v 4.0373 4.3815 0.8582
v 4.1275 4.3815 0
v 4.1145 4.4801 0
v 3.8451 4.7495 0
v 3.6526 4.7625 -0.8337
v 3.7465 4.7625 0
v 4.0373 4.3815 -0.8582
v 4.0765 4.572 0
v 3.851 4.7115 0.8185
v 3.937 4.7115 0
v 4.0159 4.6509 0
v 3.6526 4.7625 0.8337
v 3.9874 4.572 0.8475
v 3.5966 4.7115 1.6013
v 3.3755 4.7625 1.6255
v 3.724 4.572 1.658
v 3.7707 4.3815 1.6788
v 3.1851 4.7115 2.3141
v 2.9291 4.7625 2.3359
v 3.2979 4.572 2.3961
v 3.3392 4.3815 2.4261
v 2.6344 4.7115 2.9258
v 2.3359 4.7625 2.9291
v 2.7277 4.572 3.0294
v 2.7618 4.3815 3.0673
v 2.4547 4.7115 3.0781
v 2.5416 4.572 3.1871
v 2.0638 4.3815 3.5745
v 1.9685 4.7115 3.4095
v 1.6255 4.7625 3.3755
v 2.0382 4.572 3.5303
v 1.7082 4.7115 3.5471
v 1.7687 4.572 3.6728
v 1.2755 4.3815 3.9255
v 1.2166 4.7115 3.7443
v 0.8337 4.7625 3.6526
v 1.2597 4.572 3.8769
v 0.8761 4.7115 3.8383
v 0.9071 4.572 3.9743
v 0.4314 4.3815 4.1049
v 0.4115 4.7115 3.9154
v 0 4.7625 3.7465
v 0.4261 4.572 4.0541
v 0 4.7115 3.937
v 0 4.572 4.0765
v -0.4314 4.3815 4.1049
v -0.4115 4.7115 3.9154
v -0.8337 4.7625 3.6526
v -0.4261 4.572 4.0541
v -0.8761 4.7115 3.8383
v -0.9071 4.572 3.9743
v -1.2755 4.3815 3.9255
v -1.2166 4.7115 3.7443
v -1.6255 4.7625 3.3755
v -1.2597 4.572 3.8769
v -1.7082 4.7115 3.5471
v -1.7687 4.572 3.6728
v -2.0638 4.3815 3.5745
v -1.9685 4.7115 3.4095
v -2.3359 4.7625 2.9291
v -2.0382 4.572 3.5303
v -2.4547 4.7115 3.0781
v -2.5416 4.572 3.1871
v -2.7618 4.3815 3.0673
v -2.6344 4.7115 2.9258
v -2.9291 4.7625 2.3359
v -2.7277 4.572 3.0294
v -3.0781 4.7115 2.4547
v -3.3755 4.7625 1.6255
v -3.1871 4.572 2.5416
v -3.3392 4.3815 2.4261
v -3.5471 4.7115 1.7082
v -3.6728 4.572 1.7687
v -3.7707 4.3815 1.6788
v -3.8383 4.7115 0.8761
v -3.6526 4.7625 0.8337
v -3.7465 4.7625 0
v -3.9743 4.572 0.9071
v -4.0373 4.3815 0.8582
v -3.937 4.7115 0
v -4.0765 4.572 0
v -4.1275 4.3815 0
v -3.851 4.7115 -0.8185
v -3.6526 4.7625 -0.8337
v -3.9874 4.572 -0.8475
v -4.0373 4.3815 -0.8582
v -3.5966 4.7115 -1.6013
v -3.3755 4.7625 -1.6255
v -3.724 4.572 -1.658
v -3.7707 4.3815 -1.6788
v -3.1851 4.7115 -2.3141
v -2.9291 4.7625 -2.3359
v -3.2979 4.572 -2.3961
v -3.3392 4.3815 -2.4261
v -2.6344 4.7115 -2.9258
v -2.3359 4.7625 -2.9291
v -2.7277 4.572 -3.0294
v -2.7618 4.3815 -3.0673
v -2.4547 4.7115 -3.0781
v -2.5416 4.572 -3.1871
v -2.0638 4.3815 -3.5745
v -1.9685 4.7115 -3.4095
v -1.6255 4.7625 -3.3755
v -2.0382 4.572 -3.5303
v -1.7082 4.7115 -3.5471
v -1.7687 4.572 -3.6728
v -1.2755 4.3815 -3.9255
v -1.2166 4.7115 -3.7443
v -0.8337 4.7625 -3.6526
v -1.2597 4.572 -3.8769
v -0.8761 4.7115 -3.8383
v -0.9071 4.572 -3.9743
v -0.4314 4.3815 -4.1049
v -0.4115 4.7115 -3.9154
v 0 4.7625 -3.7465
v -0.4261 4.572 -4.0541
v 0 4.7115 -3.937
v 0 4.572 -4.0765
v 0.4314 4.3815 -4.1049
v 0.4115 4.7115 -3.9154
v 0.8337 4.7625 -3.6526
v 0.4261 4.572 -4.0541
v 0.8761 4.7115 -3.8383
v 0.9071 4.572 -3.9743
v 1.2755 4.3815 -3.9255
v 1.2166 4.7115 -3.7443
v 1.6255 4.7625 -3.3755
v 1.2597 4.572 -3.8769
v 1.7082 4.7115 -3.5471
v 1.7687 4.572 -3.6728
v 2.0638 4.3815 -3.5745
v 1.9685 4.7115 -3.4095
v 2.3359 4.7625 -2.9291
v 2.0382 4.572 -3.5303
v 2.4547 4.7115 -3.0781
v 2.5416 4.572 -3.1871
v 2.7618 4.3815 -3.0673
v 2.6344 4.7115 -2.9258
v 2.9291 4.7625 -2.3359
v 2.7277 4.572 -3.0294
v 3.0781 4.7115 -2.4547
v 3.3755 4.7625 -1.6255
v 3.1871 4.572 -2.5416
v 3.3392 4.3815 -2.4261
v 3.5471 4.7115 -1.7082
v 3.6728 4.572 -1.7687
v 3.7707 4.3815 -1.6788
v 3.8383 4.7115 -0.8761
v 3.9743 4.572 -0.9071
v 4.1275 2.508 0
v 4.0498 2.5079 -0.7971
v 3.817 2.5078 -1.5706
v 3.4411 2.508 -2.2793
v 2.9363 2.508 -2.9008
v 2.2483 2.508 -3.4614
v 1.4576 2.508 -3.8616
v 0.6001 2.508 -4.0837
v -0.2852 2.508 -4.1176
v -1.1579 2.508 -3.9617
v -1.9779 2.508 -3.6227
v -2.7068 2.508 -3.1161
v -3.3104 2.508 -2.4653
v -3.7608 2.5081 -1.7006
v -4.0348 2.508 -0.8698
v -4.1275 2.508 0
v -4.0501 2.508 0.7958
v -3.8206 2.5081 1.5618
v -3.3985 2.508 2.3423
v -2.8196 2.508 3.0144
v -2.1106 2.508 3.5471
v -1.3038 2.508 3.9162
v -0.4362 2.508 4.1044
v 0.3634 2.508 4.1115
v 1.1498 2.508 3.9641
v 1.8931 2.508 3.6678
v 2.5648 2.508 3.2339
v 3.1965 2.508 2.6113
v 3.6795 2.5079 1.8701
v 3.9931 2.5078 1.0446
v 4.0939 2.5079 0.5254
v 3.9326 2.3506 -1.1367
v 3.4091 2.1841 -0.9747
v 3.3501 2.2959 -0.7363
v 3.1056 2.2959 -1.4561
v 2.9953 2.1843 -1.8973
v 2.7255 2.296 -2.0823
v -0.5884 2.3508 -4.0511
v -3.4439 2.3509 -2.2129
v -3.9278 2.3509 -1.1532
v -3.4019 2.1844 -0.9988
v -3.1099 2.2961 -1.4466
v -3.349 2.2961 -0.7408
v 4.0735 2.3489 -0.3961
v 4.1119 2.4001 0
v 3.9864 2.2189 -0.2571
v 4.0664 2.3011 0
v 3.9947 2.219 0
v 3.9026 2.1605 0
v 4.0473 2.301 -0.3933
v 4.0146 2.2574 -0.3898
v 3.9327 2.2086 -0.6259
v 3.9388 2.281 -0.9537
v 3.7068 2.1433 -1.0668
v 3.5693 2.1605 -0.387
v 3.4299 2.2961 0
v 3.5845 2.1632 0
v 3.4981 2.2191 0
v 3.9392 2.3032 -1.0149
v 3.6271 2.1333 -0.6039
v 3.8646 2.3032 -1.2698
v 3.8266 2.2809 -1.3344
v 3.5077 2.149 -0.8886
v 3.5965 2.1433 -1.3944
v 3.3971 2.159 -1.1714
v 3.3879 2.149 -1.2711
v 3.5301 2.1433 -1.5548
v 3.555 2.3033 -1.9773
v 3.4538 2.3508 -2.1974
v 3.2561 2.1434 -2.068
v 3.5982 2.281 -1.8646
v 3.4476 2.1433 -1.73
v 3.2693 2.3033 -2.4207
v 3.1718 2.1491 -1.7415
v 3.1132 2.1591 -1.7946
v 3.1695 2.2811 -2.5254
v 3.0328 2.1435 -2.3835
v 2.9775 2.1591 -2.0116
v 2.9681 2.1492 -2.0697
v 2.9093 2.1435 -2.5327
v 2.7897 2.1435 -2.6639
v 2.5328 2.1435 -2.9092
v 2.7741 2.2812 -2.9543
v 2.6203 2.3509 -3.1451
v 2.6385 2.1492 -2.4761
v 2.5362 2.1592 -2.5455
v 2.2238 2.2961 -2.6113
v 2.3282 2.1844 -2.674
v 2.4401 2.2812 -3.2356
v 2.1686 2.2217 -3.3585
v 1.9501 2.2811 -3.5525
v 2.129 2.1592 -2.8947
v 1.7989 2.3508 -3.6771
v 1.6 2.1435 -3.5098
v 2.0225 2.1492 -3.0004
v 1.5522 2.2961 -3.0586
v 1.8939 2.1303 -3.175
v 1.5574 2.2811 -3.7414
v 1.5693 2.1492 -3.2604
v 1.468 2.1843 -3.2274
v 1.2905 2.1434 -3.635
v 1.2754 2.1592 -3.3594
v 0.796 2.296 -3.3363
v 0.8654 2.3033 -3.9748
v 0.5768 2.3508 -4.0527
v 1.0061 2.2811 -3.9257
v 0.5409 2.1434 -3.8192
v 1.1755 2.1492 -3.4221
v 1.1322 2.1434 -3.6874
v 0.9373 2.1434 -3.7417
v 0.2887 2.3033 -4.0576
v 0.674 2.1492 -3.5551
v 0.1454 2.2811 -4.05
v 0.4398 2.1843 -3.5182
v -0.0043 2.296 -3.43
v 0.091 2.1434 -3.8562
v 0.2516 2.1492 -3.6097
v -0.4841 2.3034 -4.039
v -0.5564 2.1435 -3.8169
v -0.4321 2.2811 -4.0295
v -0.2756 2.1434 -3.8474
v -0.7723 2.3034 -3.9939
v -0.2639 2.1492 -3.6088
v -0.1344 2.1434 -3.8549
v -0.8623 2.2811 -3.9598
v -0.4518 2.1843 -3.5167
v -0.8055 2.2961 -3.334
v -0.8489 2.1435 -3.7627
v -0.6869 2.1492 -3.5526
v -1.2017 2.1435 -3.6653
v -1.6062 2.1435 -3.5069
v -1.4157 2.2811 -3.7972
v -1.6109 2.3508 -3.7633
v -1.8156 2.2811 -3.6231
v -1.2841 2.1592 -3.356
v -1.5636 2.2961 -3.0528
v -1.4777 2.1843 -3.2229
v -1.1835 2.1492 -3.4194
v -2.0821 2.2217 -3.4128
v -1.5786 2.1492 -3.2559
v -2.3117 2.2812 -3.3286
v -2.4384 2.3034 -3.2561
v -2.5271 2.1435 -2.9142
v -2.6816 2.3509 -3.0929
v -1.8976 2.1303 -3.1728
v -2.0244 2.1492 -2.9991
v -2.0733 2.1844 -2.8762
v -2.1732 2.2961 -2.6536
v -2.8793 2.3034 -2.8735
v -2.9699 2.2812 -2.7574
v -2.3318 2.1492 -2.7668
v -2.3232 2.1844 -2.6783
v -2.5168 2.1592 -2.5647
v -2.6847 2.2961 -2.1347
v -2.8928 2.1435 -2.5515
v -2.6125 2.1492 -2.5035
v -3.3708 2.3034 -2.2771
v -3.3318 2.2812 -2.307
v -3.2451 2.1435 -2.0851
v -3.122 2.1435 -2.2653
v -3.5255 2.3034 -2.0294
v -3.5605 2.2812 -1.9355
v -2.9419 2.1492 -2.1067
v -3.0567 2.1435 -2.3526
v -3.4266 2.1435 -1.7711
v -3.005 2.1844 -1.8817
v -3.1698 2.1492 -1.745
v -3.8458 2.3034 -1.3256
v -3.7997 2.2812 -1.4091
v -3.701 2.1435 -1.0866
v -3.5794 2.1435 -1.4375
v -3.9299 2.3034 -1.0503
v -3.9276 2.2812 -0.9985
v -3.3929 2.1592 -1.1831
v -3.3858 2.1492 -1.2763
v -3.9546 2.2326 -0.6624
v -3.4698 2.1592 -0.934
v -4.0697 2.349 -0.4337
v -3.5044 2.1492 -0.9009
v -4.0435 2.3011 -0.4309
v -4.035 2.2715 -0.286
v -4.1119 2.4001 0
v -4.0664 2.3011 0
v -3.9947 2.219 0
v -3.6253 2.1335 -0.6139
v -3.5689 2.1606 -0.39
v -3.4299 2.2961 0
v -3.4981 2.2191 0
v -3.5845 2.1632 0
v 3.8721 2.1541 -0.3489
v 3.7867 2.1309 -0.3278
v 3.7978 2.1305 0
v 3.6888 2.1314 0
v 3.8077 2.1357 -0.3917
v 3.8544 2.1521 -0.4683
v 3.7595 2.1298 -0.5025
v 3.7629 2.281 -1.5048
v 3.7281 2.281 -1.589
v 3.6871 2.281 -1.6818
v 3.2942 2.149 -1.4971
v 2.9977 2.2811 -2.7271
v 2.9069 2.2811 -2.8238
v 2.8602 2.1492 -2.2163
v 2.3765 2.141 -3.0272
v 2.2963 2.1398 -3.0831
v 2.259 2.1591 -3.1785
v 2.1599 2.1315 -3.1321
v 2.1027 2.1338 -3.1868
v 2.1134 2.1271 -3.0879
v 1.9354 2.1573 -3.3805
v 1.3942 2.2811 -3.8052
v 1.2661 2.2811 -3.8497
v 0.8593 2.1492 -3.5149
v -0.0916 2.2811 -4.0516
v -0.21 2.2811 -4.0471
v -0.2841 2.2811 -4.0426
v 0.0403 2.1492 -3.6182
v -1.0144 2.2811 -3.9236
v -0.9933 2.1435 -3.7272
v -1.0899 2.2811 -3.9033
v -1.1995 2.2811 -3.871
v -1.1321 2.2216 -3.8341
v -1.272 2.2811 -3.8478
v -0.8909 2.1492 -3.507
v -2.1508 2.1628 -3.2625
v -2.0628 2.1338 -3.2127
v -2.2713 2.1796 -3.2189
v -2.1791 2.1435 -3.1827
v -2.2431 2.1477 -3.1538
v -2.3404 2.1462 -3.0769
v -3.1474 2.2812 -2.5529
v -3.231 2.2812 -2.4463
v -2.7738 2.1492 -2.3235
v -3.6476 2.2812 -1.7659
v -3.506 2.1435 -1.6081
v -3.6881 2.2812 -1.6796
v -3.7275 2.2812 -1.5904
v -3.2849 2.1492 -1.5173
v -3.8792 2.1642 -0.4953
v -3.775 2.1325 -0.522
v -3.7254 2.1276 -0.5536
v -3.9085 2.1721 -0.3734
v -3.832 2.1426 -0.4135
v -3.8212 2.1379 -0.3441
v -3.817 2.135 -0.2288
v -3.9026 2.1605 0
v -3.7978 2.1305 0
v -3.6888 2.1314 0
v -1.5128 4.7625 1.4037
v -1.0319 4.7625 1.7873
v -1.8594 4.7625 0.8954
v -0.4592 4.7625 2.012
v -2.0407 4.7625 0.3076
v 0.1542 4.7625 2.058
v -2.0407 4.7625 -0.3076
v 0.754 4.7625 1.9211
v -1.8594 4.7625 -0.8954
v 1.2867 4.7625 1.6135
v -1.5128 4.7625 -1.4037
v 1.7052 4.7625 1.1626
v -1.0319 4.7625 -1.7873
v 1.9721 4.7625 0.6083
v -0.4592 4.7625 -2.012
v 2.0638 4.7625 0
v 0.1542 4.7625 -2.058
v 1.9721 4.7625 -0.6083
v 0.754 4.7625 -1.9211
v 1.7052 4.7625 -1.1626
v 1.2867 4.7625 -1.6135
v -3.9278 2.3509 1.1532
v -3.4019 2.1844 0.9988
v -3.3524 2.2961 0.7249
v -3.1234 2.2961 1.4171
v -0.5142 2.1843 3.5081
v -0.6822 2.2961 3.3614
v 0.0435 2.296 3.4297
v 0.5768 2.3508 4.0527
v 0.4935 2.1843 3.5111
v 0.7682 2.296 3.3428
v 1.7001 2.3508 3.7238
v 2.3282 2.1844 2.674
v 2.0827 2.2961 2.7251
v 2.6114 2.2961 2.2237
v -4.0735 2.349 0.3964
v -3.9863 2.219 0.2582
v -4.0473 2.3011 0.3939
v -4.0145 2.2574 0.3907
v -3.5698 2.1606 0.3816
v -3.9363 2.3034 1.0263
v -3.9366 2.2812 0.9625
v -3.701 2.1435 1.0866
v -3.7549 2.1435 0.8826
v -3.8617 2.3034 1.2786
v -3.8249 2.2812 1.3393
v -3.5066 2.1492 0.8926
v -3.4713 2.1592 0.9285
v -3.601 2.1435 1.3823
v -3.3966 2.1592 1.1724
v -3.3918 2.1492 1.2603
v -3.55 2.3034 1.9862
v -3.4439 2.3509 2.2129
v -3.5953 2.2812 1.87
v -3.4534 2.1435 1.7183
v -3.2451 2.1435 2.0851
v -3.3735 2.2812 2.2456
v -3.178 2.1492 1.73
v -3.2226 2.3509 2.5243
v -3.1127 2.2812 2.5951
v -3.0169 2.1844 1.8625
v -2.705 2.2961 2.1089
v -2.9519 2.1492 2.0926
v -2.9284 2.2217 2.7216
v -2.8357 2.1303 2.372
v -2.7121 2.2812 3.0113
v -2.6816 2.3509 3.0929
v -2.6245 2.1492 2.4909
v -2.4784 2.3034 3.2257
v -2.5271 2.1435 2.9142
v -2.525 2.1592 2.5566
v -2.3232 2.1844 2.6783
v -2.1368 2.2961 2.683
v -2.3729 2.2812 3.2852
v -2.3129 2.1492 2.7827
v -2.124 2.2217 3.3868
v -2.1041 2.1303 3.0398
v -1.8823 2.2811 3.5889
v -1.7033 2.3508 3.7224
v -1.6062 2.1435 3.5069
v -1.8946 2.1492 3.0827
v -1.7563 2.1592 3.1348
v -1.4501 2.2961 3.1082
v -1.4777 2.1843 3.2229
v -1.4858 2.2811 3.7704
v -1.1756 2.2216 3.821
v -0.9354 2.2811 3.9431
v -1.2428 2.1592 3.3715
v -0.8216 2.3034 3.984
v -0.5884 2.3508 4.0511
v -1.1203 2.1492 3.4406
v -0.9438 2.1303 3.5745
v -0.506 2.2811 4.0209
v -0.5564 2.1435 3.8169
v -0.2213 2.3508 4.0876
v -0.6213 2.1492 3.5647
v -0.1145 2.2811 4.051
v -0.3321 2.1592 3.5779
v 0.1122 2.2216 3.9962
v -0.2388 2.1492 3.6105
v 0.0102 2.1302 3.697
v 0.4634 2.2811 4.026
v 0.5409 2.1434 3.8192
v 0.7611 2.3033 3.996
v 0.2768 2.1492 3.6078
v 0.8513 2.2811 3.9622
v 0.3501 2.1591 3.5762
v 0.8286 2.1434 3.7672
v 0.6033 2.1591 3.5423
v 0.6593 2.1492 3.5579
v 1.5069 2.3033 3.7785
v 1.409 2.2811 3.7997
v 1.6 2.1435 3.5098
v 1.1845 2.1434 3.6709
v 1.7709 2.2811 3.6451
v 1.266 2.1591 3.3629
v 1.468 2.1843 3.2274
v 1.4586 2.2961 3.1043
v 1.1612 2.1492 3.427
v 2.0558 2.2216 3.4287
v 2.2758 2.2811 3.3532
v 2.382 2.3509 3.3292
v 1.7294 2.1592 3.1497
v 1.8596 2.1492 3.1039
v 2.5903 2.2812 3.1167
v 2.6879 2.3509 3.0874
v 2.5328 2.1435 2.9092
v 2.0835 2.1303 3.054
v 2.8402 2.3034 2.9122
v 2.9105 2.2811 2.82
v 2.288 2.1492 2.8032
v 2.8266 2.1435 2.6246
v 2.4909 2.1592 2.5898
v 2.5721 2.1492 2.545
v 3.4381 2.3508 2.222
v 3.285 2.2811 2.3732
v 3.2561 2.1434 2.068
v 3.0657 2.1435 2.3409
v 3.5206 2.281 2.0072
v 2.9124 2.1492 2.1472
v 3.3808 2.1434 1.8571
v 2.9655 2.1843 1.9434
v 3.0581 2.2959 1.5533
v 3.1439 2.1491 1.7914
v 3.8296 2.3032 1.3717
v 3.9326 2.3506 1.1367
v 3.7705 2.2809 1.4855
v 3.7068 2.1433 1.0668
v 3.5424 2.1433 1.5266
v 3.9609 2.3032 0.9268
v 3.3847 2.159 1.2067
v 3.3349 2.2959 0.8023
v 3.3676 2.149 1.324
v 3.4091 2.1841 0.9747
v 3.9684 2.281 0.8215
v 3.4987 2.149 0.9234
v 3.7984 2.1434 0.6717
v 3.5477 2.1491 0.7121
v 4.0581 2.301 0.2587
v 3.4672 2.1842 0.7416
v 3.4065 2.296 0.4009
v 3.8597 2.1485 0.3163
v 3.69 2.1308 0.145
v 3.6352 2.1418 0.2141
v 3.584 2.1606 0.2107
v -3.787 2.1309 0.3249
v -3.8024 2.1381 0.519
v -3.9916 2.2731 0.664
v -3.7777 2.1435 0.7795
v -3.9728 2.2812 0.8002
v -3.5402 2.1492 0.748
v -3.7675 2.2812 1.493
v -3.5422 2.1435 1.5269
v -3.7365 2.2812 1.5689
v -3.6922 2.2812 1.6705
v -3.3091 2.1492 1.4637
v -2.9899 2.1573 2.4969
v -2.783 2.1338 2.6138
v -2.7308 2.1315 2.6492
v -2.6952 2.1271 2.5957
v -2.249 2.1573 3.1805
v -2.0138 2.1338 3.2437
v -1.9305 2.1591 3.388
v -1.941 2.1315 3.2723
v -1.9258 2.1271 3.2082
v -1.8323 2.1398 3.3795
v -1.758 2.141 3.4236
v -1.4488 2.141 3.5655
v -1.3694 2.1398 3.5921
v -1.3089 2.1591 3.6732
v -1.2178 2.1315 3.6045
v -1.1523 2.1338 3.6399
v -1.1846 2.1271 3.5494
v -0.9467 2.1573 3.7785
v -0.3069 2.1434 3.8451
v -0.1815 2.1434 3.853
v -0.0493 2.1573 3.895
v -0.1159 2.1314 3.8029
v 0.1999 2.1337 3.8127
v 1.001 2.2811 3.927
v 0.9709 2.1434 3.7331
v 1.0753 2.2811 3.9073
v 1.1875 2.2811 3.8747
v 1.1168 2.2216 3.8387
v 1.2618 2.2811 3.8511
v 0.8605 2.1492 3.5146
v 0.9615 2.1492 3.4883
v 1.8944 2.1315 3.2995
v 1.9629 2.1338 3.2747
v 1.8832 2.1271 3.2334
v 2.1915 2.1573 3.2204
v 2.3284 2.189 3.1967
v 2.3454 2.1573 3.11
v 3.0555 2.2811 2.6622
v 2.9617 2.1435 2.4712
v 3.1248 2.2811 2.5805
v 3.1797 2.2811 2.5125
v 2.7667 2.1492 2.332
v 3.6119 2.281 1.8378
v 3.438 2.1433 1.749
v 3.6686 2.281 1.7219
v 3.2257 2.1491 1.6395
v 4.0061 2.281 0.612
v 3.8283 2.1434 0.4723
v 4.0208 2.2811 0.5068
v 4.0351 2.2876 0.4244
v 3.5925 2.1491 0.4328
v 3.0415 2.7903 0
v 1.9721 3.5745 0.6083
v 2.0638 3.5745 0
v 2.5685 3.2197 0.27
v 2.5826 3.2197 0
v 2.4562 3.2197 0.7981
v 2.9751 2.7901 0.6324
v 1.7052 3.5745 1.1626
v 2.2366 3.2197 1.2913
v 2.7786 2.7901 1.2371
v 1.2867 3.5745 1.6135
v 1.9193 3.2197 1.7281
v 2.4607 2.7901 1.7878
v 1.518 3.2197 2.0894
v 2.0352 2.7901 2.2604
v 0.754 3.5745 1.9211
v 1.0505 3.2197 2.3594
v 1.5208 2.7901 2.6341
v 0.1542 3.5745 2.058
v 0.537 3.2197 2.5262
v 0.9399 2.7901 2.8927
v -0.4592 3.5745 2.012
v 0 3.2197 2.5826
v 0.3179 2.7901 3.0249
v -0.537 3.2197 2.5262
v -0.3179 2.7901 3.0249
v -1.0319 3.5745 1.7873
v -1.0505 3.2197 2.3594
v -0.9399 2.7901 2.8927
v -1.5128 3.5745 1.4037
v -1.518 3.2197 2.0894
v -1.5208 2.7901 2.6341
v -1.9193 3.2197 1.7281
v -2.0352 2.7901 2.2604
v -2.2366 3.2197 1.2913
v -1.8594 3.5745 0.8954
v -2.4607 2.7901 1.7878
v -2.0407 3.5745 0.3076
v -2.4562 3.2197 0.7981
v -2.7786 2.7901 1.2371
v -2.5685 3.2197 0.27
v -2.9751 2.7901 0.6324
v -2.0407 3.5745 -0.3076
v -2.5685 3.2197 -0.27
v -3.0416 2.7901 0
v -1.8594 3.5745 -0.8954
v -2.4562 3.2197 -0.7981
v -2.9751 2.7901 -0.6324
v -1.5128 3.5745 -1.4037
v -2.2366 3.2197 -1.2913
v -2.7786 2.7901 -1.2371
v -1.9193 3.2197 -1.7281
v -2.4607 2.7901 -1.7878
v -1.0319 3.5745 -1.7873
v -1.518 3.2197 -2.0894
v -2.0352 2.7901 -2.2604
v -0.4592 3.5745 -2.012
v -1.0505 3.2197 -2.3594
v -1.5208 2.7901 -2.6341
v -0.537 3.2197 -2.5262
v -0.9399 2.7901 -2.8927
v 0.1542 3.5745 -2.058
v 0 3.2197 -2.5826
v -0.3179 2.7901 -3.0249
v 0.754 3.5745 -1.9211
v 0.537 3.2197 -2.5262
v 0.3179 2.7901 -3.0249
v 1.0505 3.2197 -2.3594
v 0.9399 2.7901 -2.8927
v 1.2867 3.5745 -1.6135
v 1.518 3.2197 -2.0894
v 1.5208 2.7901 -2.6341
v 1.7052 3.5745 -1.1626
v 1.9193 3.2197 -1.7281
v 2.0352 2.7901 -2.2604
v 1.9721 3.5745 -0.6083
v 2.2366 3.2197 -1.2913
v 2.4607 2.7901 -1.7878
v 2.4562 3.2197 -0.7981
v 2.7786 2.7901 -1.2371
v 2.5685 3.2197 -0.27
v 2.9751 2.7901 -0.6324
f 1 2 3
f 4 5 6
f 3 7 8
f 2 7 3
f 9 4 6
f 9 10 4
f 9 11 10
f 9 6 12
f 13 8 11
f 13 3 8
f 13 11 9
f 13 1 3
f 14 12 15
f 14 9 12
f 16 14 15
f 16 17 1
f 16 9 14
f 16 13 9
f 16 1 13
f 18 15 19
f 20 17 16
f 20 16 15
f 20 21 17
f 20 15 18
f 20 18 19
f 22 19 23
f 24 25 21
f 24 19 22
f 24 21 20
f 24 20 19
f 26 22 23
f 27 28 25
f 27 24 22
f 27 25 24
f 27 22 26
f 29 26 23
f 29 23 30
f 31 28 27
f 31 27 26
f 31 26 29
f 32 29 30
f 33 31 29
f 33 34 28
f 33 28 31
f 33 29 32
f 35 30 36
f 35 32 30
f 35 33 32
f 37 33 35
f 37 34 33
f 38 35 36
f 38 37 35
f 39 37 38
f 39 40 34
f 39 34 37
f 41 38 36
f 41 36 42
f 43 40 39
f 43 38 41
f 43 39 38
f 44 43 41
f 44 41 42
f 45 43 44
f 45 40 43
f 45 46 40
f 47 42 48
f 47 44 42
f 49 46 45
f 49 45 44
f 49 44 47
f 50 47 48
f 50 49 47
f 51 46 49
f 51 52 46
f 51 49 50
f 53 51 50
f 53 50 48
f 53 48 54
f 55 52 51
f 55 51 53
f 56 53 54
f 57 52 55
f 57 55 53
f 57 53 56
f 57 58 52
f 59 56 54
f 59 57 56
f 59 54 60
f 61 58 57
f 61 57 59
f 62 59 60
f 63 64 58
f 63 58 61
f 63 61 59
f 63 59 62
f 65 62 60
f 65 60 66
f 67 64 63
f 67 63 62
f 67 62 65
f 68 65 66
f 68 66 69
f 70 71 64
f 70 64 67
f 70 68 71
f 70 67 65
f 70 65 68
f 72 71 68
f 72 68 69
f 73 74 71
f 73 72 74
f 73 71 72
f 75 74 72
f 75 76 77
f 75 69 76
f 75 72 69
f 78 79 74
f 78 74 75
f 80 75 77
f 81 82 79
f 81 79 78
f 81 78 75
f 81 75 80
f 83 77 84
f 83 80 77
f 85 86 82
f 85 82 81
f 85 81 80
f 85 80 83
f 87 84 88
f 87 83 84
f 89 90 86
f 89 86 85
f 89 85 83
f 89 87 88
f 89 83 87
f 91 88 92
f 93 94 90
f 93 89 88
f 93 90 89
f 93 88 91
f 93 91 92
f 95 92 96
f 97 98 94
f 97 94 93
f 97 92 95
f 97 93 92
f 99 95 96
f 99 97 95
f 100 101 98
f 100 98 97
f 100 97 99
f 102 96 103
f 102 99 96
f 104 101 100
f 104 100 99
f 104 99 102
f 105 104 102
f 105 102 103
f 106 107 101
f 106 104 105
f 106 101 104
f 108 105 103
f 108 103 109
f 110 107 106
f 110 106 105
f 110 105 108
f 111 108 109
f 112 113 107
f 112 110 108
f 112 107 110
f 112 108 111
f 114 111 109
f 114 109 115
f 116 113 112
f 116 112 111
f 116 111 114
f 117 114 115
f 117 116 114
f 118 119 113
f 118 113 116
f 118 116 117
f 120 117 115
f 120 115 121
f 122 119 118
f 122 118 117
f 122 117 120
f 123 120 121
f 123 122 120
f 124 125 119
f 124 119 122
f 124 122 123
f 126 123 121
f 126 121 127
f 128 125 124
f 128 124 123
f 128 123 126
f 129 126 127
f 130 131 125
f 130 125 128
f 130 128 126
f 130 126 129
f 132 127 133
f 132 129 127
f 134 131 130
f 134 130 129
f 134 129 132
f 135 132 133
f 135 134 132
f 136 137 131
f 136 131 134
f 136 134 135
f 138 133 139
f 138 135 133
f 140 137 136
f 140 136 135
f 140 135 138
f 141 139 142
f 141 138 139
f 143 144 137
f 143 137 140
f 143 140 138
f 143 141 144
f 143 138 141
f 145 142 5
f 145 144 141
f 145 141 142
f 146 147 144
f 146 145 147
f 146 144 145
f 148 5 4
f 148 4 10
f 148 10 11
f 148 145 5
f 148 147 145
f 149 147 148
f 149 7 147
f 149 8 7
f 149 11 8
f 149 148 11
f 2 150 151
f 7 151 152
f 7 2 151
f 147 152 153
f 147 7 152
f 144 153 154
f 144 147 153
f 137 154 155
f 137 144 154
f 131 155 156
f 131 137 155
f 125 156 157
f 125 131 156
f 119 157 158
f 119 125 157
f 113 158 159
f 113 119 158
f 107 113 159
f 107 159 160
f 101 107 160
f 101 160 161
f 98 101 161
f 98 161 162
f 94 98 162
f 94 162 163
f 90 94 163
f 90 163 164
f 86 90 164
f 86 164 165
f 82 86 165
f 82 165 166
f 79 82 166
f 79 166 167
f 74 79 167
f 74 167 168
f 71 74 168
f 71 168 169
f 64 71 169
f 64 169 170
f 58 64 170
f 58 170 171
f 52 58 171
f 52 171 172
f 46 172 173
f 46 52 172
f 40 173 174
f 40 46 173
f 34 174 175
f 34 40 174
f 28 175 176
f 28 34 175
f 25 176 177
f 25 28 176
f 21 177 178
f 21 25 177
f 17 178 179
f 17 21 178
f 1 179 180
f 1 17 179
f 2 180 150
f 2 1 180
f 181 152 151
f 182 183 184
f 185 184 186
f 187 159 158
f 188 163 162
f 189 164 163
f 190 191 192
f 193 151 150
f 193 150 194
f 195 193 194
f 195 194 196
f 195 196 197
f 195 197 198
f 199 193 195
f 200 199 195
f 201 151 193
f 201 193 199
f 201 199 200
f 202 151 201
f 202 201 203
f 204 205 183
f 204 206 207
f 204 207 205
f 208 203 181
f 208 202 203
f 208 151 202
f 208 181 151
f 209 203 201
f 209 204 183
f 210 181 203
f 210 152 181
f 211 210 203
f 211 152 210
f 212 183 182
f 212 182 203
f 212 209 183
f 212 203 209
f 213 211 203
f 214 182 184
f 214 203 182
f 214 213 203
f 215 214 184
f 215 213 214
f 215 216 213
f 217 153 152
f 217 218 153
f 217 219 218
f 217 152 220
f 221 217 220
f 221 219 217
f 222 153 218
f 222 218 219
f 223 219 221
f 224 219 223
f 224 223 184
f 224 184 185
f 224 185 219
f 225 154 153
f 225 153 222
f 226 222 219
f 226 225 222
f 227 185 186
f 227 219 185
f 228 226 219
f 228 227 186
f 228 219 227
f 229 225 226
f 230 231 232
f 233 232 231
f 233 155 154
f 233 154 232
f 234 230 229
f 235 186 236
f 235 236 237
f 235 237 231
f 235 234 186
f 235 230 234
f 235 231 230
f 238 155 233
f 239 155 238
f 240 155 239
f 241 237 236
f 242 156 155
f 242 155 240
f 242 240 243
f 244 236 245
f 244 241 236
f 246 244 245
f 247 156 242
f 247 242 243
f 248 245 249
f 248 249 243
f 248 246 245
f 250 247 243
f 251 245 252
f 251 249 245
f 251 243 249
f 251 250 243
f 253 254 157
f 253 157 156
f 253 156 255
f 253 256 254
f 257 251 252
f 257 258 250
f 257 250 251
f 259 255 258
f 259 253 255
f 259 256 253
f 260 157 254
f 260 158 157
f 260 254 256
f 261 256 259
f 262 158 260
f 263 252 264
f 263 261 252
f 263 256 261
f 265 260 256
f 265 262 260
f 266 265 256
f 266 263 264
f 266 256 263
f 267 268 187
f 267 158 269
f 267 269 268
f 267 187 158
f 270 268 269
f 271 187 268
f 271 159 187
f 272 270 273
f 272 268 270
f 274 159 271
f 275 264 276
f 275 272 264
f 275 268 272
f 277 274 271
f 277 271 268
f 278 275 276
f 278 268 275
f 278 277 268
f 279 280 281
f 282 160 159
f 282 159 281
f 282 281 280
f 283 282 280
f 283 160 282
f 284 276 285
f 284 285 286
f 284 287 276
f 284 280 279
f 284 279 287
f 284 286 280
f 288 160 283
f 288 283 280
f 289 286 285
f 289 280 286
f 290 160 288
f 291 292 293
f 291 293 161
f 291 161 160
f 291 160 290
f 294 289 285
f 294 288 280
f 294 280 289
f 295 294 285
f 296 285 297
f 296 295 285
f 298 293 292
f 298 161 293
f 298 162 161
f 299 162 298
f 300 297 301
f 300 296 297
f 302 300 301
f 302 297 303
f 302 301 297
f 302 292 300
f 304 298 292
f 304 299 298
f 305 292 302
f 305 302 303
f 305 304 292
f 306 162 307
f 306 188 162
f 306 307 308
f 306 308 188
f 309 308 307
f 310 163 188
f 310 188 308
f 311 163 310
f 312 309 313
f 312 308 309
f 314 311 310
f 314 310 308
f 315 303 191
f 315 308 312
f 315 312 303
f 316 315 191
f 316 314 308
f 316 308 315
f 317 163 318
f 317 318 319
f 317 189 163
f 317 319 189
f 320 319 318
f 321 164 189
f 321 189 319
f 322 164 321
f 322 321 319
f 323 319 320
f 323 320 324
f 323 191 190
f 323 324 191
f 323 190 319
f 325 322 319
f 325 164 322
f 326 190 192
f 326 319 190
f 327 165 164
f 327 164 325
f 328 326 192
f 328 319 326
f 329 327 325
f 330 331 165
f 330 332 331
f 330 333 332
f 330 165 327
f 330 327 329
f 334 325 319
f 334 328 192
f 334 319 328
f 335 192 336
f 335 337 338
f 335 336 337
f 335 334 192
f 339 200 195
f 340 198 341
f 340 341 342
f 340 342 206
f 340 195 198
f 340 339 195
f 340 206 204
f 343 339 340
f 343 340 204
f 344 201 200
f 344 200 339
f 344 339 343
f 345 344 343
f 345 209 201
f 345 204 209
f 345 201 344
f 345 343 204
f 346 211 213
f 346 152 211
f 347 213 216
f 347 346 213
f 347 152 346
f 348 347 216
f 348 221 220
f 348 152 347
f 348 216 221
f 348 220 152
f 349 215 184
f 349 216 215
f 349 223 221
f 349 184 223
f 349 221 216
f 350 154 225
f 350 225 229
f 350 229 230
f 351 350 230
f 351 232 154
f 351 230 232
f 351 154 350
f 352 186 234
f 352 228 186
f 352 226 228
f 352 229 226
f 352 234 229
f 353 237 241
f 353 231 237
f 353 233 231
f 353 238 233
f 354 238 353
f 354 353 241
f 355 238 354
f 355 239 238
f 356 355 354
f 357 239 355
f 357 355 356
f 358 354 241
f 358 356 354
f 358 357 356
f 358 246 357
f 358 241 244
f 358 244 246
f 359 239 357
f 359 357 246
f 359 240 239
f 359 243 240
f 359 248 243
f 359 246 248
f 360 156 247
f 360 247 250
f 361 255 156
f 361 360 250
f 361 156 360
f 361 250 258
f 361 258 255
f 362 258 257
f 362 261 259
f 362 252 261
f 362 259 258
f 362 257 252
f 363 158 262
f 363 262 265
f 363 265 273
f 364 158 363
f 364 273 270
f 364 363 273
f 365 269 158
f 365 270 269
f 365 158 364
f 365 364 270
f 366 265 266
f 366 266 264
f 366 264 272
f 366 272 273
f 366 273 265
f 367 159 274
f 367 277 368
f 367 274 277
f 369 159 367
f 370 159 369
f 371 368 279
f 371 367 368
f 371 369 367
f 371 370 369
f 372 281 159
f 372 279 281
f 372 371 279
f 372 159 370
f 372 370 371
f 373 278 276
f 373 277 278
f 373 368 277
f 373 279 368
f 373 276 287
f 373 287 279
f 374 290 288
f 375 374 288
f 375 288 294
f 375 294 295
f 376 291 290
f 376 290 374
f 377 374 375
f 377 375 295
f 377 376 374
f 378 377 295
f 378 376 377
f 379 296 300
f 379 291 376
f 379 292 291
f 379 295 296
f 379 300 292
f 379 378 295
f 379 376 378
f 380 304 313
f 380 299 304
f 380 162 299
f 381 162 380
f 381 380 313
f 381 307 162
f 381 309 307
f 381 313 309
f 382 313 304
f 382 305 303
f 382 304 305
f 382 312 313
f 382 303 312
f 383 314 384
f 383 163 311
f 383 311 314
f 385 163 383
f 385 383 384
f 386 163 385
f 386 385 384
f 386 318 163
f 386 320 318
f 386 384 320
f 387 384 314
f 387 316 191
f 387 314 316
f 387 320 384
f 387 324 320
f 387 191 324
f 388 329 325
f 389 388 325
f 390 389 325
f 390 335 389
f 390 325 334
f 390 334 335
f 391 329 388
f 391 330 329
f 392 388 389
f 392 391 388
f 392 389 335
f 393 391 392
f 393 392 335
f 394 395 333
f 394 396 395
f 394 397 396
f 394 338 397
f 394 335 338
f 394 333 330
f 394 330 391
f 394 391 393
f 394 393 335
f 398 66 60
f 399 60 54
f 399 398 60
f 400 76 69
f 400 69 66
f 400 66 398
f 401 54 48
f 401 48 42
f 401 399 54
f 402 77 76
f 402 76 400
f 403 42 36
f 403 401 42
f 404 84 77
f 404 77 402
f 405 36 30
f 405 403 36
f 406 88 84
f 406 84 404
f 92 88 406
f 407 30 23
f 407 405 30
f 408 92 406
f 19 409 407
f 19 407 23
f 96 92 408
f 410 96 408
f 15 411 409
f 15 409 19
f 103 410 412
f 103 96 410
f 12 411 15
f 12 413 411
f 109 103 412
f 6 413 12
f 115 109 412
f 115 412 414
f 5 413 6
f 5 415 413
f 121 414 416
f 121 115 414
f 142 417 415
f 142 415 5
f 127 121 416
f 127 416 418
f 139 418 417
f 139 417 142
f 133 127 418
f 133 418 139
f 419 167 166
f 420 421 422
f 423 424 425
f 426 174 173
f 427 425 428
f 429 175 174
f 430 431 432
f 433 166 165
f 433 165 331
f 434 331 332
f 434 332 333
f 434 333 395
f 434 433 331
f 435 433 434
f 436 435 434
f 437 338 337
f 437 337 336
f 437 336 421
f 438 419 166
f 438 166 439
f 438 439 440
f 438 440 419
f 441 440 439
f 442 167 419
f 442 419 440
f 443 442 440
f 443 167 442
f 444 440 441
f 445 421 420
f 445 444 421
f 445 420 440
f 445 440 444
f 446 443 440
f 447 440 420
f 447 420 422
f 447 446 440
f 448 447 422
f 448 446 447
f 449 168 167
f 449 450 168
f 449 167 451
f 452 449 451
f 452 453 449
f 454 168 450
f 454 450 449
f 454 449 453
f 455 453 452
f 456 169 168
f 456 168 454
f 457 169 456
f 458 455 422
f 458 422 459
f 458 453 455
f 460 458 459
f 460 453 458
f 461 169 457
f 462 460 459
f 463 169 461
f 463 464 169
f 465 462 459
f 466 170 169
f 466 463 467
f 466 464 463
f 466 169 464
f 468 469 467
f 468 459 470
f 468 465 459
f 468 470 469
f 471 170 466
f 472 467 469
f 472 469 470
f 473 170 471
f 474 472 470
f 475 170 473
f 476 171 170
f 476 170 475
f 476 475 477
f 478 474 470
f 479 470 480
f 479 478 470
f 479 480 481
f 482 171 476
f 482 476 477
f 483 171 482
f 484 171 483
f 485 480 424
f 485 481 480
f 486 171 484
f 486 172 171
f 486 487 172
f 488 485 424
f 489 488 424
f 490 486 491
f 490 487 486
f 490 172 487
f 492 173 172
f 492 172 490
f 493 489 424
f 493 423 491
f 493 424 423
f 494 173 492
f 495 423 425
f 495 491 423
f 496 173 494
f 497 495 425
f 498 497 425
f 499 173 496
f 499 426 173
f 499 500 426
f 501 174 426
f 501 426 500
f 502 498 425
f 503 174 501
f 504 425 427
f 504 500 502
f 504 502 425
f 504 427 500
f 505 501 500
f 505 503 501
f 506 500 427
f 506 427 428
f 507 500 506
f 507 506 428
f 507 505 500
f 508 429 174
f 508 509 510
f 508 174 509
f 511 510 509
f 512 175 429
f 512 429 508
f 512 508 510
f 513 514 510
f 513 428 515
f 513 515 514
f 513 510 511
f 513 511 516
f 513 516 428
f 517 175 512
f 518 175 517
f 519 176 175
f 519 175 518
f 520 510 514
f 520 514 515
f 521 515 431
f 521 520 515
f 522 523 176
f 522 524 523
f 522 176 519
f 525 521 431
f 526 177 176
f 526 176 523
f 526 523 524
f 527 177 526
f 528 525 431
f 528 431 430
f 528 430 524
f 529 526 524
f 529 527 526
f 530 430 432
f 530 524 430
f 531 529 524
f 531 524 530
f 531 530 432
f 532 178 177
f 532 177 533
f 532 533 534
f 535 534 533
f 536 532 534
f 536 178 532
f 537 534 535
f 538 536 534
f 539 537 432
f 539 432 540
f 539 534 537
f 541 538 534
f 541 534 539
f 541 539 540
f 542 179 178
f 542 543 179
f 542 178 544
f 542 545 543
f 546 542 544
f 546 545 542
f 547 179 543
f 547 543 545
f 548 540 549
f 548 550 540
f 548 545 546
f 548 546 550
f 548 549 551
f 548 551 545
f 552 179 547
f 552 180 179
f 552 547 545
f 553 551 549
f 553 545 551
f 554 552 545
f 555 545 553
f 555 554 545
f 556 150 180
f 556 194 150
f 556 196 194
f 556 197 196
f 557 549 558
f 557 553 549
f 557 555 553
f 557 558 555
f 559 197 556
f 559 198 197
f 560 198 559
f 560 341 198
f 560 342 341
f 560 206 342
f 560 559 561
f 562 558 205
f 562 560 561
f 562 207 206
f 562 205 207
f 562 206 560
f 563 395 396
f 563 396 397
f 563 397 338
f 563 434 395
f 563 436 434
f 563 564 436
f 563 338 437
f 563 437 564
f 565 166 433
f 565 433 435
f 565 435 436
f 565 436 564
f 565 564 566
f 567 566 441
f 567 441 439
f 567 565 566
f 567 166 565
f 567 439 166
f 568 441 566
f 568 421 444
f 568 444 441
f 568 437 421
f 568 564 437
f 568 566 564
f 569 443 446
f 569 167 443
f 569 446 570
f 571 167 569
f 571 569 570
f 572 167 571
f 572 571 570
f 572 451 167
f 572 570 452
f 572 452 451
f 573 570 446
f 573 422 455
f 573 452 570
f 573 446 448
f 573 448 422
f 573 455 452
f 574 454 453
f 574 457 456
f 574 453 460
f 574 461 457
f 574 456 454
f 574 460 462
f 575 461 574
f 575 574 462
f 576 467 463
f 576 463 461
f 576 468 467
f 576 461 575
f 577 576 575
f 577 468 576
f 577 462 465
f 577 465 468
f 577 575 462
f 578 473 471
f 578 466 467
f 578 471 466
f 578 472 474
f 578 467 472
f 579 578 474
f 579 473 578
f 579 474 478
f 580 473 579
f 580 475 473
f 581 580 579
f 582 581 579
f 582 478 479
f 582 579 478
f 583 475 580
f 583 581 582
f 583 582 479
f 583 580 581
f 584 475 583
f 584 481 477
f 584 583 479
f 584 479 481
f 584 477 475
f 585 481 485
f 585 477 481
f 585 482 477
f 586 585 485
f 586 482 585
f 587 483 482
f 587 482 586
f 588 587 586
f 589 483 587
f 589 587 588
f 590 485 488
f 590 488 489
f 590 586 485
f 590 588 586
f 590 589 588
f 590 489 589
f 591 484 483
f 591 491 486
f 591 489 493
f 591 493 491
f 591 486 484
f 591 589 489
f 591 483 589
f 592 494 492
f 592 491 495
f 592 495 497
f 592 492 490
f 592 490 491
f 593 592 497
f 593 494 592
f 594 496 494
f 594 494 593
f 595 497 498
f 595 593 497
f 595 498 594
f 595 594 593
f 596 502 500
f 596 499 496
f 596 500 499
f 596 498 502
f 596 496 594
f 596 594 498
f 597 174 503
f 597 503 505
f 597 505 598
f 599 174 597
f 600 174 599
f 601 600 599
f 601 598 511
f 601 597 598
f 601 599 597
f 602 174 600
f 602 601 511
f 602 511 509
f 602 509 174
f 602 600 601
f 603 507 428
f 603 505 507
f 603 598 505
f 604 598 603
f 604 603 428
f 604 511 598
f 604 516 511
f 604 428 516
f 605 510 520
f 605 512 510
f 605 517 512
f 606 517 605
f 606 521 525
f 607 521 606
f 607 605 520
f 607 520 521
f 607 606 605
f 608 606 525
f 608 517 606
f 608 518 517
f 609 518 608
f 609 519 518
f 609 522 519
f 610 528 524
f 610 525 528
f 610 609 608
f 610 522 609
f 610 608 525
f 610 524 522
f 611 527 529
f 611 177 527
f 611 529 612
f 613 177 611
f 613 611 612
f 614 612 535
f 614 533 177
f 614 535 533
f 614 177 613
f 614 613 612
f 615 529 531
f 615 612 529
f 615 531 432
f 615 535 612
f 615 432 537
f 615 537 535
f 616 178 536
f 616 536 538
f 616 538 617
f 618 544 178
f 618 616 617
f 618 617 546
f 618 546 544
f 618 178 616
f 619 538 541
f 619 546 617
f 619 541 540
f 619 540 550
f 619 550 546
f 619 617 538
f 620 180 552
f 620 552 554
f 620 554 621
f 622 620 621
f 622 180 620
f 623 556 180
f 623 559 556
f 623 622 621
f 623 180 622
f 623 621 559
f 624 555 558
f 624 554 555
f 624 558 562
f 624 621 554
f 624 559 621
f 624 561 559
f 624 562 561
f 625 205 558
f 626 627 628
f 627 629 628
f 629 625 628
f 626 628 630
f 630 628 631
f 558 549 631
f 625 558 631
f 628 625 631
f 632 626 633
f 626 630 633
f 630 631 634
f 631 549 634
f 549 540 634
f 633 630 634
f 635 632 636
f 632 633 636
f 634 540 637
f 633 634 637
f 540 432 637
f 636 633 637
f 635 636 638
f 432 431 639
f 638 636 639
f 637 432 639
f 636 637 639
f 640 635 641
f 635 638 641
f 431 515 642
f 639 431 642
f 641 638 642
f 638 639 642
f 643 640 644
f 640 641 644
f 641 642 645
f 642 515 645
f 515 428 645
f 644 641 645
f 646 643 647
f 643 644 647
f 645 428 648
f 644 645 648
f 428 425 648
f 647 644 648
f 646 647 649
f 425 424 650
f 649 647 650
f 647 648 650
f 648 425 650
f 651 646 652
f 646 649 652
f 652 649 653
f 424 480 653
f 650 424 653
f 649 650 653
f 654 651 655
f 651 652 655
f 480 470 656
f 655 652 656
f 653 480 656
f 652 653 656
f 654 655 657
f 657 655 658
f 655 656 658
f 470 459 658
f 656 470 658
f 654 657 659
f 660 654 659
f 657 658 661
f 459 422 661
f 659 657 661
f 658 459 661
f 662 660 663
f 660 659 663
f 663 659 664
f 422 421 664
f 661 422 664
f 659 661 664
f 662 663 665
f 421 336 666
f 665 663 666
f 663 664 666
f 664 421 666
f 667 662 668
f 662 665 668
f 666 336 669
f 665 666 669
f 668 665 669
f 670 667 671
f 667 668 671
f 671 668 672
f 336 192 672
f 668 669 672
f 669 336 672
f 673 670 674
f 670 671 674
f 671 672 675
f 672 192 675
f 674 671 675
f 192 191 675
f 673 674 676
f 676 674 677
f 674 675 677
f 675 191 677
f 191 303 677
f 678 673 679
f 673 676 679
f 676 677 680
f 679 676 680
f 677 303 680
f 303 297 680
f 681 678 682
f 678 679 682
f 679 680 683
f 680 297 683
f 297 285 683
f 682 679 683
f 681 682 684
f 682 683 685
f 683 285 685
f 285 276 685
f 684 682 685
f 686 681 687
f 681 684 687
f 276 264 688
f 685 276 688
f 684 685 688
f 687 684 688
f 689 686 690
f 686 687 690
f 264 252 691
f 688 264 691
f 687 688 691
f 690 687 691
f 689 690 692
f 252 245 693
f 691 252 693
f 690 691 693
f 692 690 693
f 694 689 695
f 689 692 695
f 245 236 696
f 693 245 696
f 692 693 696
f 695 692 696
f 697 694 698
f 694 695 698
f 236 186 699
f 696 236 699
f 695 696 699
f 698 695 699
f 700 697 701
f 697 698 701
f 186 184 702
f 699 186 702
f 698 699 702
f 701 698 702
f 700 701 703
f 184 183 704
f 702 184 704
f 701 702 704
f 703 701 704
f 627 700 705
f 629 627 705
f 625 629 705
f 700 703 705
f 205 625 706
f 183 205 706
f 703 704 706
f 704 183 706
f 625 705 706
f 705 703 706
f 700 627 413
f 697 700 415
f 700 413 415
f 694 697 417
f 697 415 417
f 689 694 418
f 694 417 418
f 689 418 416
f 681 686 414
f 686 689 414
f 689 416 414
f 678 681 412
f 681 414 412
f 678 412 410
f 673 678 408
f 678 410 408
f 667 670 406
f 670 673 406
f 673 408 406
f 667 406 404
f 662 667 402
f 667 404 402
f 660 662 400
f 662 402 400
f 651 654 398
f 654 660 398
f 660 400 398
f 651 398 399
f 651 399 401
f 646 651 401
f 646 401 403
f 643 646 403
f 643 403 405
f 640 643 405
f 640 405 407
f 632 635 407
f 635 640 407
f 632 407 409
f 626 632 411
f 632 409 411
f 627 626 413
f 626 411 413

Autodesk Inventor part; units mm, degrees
ref_plane "YZ Plane" through (0, 0, 0) normal (1, 0, 0) x (0, 1, 0)
ref_plane "XZ Plane" through (0, 0, 0) normal (0, 1, 0) x (-1, 0, 0)
ref_plane "XY Plane" through (0, 0, 0) normal (0, 0, 1) x (1, 0, 0)
sketch "Sketch1" plane through (0, 0, 0) normal (0, 0, 1) x (1, 0, 0)
  line L0 (0, -0.996467) -> (0, 5.9788) construction
  line L1 (-0.996467, 0) -> (5.9788, 0) construction
  line L2 (4.1275, 0) -> (4.1275, 4.7625)
  line L3 (4.1275, 4.7625) -> (0, 4.7625)
  line L4 (0, 4.7625) -> (0, 4.1275)
  arc A0 (4.1275, 0) -> (0, 4.1275) centre (0, 0) ccw
  point P0 (0, 0)
  dimension "d0" = 4.7625
  dimension "d1" = 4.1275
  dimension "d2" = 0.635
  dimension "d3" = 4.1275
sketch "Sketch1 outline for Revolution1" plane through (0, 0, 0) normal (0, 0, 1) x (1, 0, 0)
  arc A0 (0, 4.1275) -> (4.1275, 0) centre (0, 0) cw
  line L0 (0, 4.7625) -> (0, 4.1275)
  line L1 (4.1275, 4.7625) -> (0, 4.7625)
  line L2 (4.1275, 0) -> (4.1275, 4.7625)
revolve "Revolution1" add sketch "Sketch1 outline for Revolution1" angle 360 about axis through (0, -10, 0) along (0, 1, 0)
fillet "Fillet1" radius 0.381 2 edges at (-4.1275, 4.7625, 0) (-4.1275, 0, 0)
sketch "Sketch2" plane through (0, 4.7625, 0) normal (0, 1, 0) x (1, 0, 0)
  circle A0 centre (0, 0) radius 2.06375
  dimension "d6" = 4.1275
sketch "Sketch2 outline for Extrusion1" plane through (0, 4.7625, 0) normal (0, 1, 0) x (1, 0, 0)
  circle A0 centre (0, 0) radius 2.06375
extrude "Extrusion1" cut sketch "Sketch2 outline for Extrusion1" along normal through all both and the other way through all
properties part number "Pillow Ball Bushing"
